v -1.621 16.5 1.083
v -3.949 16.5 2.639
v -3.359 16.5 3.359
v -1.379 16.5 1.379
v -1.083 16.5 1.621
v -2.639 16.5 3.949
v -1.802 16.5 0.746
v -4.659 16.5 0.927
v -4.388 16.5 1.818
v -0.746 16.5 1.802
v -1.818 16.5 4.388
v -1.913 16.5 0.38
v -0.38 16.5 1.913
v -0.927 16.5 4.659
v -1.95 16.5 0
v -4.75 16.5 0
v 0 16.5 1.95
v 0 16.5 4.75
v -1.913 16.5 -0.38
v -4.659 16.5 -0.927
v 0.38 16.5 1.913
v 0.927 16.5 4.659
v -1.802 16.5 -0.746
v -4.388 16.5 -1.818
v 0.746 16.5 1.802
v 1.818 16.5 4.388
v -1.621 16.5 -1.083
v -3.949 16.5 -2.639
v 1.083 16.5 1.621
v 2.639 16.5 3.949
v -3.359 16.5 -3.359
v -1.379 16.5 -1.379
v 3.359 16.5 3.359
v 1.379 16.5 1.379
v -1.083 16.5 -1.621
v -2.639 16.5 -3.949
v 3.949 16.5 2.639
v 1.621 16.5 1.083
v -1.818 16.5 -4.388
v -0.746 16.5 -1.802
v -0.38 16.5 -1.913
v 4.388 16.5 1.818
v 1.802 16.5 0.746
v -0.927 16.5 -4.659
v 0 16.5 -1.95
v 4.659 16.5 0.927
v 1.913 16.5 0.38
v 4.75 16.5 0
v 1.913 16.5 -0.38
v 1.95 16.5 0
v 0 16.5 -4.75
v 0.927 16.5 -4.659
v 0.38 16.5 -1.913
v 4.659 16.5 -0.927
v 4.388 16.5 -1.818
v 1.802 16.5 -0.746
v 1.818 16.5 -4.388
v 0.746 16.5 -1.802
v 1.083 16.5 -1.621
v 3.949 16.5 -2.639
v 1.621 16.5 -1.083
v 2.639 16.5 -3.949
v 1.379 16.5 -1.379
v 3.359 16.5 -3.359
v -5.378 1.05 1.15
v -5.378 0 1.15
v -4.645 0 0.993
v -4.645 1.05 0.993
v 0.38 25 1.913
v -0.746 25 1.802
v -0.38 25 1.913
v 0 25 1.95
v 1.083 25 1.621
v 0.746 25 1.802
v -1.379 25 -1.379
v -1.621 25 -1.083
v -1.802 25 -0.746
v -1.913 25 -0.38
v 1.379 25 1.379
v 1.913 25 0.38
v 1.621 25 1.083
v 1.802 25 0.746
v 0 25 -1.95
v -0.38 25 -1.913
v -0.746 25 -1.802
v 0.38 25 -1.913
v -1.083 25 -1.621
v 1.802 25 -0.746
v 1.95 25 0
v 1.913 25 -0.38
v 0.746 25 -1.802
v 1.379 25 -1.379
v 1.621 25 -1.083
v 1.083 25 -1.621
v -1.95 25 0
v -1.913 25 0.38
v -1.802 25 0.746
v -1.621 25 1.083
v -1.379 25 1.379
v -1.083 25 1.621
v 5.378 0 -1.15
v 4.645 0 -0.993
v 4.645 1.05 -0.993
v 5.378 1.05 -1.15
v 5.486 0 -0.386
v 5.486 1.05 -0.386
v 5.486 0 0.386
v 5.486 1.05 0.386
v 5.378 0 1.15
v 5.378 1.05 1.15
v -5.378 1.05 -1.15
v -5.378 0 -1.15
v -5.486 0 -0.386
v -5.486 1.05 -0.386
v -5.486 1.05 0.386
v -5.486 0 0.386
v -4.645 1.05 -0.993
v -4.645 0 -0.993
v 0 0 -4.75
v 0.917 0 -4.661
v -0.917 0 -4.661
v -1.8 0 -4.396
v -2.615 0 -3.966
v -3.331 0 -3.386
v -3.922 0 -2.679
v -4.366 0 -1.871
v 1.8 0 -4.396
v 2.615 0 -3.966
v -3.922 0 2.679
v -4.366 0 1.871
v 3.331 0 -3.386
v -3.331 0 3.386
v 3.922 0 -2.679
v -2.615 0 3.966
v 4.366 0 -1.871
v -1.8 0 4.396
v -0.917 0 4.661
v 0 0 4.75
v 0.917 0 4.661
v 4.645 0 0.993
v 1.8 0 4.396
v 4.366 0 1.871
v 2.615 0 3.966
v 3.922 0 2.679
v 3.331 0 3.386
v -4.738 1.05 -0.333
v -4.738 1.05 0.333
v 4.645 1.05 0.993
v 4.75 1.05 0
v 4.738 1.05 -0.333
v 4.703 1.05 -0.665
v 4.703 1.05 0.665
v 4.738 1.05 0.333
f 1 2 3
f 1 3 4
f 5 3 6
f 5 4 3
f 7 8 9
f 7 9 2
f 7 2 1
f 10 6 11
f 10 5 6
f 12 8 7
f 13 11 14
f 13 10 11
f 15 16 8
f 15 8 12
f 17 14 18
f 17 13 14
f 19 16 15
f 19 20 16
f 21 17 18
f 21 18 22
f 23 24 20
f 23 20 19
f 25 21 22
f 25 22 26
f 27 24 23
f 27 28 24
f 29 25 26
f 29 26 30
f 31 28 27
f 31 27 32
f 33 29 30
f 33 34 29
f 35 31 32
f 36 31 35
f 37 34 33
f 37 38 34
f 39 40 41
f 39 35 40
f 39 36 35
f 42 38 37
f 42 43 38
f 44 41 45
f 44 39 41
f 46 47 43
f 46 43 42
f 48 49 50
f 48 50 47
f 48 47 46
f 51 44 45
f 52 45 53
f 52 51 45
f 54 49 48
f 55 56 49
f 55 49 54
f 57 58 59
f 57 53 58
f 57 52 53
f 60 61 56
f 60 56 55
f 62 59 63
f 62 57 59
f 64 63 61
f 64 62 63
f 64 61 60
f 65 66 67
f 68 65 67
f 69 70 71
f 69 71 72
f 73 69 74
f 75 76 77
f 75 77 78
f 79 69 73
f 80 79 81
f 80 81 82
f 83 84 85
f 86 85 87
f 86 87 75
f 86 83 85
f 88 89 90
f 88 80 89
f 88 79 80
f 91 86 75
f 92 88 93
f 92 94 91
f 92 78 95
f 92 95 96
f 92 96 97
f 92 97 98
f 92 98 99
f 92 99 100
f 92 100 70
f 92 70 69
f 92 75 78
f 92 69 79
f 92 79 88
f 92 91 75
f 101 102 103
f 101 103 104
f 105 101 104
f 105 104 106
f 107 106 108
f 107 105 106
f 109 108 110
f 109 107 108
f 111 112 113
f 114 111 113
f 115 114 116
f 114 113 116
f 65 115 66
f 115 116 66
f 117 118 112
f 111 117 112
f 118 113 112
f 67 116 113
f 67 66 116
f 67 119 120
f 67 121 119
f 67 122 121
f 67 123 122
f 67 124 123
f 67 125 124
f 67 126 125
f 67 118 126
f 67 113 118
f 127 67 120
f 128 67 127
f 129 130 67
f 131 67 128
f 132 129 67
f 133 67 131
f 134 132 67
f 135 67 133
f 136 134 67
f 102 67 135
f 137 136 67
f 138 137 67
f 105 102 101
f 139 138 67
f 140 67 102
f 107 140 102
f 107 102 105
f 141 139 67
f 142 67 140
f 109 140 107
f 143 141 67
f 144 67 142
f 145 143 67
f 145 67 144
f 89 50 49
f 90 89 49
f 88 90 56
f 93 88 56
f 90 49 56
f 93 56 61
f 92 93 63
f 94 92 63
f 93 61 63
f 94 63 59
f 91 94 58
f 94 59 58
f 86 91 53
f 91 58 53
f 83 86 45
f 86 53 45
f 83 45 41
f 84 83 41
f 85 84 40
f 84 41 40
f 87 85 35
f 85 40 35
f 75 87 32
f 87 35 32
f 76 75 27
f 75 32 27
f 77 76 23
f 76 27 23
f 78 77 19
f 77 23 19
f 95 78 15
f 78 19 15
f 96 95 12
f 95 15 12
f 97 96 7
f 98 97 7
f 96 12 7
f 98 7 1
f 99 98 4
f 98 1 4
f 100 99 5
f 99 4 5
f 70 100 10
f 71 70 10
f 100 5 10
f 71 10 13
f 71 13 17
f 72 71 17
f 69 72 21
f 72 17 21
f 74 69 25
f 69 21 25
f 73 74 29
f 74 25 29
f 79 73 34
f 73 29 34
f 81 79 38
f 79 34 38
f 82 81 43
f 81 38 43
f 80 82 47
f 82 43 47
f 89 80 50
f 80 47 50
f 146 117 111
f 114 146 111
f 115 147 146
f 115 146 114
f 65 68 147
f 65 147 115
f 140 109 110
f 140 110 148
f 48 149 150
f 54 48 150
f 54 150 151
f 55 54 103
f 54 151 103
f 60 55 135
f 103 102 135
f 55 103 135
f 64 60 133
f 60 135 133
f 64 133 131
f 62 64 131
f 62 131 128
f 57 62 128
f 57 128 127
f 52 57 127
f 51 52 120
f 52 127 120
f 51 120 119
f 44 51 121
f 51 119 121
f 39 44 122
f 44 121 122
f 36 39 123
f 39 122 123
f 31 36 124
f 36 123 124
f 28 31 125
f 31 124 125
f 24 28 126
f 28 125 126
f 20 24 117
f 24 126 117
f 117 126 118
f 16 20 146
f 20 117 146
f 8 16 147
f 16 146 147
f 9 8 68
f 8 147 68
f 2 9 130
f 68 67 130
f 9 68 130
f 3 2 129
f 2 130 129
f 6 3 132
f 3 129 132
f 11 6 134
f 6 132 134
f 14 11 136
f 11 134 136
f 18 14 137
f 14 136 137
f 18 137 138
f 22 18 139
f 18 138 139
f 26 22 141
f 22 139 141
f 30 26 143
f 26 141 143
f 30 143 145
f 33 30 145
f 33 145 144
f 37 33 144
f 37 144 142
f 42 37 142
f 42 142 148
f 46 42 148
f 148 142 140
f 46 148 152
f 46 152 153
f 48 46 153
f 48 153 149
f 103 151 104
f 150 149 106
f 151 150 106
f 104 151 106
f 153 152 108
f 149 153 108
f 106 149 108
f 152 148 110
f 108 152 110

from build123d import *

# Parameters (mm, degrees)
SKETCH1_R           = 4.75
BOSS_EXTRUDE1_DEPTH = 16.5
SKETCH2_R           = 1.95
BOSS_EXTRUDE2_DEPTH = 8.5
BOSS_EXTRUDE3_DEPTH = 1.05


with BuildPart() as part:
    # Sketch1 → Boss-Extrude1 (new body)
    with BuildSketch(Plane(origin=(0, 0, 0), x_dir=(1, 0, 0), z_dir=(0, 1, 0))):
        Circle(SKETCH1_R)
    extrude(amount=BOSS_EXTRUDE1_DEPTH)

    # Sketch2 → Boss-Extrude2 (add)
    with BuildSketch(Plane(origin=(0, 16.5, 0), x_dir=(1, 0, 0), z_dir=(0, 1, 0))):
        Circle(SKETCH2_R)
    extrude(amount=BOSS_EXTRUDE2_DEPTH)

    # Sketch3 → Boss-Extrude3 (add)
    with BuildSketch(Plane.XZ):
        with BuildLine():
            Line((-5.378429139, 1.15), (-4.645006983, 0.993181818))
            ThreePointArc((-4.645006983, 0.993181818), (-4.75, 0), (-4.645006983, -0.993181818))
            Line((-4.645006983, -0.993181818), (-5.378429139, -1.15))
            ThreePointArc((-5.378429139, -1.15), (-5.5, 0), (-5.378429139, 1.15))
        make_face()
        with BuildLine():
            Line((4.645006983, -0.993181818), (5.378429139, -1.15))
            ThreePointArc((5.378429139, -1.15), (5.5, 0), (5.378429139, 1.15))
            Line((5.378429139, 1.15), (4.645006983, 0.993181818))
            ThreePointArc((4.645006983, 0.993181818), (4.75, 0), (4.645006983, -0.993181818))
        make_face()
    extrude(amount=-BOSS_EXTRUDE3_DEPTH)


solid = part.part
